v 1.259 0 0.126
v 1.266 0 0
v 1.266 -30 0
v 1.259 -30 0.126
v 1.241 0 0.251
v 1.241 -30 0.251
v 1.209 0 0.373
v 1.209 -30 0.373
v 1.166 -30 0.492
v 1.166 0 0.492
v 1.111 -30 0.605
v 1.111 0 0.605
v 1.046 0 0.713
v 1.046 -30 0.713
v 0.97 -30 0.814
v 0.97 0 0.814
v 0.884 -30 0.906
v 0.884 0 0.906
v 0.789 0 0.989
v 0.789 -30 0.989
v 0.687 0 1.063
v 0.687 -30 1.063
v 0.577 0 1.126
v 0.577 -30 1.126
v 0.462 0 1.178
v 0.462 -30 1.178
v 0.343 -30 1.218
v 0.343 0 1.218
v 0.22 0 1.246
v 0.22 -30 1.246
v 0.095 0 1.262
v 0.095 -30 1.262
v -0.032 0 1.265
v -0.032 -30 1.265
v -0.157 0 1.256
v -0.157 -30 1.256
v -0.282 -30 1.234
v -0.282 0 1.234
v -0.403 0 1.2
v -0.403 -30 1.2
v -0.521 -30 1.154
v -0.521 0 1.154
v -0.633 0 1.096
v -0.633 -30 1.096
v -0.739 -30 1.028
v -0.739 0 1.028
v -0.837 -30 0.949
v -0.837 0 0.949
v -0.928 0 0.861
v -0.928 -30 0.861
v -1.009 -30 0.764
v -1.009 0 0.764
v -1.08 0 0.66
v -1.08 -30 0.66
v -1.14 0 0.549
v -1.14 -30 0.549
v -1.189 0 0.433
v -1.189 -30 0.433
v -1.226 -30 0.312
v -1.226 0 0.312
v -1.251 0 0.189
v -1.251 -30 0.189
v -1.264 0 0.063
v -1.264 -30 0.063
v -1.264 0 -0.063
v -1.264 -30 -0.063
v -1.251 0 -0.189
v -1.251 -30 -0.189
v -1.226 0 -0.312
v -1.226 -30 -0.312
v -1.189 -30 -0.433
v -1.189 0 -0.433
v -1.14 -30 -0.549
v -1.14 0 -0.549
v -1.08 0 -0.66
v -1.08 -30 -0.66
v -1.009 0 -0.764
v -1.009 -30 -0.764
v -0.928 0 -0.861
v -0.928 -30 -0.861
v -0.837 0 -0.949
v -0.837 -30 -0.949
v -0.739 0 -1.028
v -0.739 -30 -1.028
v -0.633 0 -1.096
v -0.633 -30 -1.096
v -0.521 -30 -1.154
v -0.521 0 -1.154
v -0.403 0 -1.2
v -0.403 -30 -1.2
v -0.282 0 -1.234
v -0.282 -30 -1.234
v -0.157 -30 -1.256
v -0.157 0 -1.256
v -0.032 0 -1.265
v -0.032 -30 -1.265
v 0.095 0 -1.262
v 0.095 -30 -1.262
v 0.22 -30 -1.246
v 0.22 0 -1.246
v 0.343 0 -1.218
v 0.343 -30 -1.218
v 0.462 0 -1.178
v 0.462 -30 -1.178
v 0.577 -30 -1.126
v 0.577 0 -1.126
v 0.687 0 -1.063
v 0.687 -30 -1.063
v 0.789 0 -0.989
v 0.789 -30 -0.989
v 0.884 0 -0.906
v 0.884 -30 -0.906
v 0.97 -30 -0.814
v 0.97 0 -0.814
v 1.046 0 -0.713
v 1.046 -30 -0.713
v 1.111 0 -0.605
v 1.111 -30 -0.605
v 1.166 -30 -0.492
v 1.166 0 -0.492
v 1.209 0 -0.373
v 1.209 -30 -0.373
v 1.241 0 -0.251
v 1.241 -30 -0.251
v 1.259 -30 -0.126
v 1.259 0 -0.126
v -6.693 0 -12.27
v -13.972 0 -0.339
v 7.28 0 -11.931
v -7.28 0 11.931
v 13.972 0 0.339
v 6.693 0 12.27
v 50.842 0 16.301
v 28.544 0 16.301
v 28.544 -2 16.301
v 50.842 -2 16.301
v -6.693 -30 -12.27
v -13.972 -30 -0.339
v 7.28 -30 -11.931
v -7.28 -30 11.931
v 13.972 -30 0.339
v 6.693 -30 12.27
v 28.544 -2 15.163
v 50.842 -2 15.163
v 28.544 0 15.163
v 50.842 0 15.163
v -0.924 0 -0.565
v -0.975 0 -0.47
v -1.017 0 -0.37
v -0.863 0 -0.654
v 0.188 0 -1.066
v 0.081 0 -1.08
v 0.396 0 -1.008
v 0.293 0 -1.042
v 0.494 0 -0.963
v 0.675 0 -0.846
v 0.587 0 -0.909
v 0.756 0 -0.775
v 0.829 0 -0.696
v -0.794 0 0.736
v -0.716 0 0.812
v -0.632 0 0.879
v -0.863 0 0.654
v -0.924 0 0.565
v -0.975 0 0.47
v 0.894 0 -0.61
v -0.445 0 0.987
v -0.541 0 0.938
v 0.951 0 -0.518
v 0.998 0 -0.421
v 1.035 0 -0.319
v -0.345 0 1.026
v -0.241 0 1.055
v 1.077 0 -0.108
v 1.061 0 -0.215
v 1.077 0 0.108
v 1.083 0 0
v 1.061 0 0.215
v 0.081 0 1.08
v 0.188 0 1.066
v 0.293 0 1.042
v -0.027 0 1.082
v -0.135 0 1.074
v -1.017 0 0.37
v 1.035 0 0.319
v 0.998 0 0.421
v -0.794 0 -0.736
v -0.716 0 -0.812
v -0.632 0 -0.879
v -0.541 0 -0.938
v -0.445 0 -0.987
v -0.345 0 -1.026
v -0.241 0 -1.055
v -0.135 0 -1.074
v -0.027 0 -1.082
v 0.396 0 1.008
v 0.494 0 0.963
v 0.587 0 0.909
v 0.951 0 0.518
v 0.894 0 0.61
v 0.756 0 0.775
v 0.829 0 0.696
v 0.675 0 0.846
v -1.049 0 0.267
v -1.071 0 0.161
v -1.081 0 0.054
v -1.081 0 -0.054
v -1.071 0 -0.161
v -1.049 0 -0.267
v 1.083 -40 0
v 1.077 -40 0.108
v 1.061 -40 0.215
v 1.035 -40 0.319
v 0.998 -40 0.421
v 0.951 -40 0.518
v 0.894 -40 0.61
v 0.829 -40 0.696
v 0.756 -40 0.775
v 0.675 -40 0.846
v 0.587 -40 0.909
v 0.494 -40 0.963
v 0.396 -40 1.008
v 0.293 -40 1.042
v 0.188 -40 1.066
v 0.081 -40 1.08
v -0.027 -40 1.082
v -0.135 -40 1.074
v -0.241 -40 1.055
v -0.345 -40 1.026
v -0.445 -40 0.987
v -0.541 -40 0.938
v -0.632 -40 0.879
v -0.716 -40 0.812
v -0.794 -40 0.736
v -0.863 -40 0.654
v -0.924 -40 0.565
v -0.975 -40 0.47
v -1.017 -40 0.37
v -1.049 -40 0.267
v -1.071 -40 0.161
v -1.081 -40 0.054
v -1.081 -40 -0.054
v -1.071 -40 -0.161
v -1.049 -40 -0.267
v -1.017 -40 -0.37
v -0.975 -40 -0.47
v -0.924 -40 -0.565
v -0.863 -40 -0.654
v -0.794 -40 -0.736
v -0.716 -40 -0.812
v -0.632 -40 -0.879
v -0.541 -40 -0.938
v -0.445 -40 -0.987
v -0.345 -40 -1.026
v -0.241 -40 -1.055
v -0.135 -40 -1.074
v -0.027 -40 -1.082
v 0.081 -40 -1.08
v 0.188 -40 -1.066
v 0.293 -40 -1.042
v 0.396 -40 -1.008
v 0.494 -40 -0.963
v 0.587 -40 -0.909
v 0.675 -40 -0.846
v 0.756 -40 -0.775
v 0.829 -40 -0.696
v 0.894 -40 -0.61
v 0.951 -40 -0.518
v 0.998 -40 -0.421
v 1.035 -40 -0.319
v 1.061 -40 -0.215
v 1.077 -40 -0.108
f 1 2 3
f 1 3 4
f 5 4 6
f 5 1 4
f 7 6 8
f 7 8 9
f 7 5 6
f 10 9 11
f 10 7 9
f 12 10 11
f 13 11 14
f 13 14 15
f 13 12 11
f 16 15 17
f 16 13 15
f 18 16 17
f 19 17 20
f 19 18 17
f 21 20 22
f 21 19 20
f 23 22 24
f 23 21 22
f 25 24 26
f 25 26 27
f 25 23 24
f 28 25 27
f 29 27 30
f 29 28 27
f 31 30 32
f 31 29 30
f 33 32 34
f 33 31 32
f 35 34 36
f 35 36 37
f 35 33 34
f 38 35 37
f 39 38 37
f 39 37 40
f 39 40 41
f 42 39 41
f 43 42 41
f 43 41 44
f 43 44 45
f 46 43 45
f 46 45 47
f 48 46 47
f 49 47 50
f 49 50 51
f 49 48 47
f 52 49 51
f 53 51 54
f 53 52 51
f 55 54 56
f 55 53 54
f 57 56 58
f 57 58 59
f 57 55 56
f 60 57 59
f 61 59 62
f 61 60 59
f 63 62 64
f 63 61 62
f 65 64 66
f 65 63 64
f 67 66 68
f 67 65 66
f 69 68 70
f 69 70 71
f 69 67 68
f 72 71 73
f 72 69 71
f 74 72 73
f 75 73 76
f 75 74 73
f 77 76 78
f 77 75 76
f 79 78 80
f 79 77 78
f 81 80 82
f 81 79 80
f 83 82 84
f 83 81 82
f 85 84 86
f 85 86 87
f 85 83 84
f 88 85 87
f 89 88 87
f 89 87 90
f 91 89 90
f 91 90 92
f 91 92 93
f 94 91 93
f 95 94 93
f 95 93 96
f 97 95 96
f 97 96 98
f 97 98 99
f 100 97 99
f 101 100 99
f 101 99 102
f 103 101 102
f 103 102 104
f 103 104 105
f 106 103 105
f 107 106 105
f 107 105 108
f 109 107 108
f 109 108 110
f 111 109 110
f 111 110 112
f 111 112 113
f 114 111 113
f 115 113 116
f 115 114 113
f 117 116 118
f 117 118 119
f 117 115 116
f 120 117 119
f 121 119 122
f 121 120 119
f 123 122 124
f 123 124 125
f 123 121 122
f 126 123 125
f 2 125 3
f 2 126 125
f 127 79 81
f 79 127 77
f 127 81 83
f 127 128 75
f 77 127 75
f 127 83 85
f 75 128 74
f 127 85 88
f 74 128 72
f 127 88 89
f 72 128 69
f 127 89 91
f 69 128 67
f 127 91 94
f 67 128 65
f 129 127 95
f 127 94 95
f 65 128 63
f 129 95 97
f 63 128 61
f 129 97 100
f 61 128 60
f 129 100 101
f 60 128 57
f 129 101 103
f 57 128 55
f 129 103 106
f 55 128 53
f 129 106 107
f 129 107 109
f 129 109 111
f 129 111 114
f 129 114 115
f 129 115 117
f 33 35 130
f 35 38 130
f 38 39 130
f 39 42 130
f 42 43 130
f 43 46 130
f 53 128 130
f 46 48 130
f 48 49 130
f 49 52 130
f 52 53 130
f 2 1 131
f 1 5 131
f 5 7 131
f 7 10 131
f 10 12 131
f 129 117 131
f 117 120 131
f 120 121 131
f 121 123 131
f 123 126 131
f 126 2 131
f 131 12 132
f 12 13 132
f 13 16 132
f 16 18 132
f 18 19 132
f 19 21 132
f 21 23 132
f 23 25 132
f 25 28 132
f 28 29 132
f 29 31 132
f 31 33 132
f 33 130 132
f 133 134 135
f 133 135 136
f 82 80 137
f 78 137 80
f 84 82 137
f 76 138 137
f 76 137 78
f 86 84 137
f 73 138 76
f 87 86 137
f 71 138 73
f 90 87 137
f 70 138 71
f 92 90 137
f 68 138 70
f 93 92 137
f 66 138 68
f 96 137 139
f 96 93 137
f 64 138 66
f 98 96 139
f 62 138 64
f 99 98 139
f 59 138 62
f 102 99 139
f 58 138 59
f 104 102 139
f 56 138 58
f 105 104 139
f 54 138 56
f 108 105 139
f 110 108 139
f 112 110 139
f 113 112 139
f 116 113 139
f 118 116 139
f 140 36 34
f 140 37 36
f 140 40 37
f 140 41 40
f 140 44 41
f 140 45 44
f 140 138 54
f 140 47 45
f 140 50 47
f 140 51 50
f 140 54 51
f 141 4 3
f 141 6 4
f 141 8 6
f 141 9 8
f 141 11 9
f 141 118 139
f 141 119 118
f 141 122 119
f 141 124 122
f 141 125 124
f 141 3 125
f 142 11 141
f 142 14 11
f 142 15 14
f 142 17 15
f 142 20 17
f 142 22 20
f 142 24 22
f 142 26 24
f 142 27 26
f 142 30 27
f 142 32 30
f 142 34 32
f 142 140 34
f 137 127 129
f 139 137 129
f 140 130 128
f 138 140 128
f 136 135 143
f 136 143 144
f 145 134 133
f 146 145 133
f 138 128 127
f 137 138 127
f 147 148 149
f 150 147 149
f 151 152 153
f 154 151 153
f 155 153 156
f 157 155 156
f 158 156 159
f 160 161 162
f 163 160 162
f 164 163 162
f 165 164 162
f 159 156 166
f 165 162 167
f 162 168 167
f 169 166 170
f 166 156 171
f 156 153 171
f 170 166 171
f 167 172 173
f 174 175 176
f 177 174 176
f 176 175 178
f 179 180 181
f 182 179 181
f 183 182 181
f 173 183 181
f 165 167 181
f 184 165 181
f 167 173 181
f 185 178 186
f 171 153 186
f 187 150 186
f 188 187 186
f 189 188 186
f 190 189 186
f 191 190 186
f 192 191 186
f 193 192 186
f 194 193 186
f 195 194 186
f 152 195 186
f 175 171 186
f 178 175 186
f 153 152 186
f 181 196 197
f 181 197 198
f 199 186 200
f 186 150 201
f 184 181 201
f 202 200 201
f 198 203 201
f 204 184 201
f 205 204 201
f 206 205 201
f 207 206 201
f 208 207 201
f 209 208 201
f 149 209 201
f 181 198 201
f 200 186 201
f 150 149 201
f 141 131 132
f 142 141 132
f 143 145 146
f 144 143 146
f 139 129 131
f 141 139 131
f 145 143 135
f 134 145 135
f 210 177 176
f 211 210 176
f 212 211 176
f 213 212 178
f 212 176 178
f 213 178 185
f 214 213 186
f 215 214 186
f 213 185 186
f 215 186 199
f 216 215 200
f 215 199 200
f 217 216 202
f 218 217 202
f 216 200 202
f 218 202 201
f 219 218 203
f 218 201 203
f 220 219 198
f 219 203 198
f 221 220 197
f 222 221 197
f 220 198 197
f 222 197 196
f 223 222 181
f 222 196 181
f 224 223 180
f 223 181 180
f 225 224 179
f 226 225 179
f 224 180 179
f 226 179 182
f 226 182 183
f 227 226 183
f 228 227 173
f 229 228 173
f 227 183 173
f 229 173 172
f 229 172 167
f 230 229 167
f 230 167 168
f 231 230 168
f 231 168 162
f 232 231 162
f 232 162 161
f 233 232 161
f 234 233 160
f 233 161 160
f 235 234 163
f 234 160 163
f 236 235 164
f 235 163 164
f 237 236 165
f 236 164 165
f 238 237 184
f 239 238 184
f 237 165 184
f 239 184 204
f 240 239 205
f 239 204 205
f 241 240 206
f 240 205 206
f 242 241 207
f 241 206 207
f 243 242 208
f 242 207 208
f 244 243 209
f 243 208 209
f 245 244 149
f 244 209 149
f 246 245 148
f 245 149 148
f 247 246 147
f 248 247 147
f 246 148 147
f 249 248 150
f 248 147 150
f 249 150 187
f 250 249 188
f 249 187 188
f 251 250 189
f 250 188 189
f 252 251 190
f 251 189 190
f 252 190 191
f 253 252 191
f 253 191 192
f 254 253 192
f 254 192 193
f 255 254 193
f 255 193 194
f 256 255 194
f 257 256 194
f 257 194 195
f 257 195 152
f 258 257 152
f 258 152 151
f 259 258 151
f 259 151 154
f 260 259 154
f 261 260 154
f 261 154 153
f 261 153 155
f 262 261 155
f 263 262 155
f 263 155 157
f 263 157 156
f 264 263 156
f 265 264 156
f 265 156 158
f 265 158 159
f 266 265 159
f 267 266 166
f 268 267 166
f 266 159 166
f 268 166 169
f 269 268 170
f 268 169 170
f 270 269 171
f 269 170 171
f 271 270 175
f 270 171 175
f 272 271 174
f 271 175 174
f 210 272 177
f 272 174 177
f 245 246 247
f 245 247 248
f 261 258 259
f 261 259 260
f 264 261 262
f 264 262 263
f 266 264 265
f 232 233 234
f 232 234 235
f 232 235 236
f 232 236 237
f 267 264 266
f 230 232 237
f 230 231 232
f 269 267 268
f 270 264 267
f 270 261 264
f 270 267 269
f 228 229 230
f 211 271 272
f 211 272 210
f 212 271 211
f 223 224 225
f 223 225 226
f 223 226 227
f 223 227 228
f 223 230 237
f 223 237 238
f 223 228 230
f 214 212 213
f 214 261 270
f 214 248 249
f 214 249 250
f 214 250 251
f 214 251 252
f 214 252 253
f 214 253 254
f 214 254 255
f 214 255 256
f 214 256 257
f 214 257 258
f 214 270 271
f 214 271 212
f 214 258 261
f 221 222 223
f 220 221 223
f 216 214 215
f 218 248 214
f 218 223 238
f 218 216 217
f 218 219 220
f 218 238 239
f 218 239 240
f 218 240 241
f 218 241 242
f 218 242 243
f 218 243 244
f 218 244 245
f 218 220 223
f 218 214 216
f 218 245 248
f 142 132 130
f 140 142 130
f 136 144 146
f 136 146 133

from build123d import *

# Parameters (mm, degrees)
F0_R     = 1.265608
F1_DEPTH = 30
F2_R     = 1.082601
F3_DEPTH = 40
F4_W     = 22.298387
F4_H     = 1.138642
F5_DEPTH = 2


with BuildPart() as f1:
    # F0 (on Front) → F1 (new body)
    with BuildSketch(Plane.XZ):
        Polygon((7.279668, -11.930907), (13.972302, 0.338924), (6.692634, 12.26983), (-7.279668, 11.930907), (-13.972302, -0.338924), (-6.692634, -12.26983), align=None)
        Circle(F0_R, mode=Mode.SUBTRACT)
    extrude(amount=F1_DEPTH)


with BuildPart() as f3:
    # F2 (on Front) → F3 (new body)
    with BuildSketch(Plane.XZ):
        Circle(F2_R)
    extrude(amount=F3_DEPTH)


with BuildPart() as f5:
    # F4 (on Front) → F5 (new body)
    with BuildSketch(Plane.XZ):
        with Locations((39.693181, 15.732166)):
            Rectangle(F4_W, F4_H)
    extrude(amount=F5_DEPTH)


solid = Compound([f1.part, f3.part, f5.part])
